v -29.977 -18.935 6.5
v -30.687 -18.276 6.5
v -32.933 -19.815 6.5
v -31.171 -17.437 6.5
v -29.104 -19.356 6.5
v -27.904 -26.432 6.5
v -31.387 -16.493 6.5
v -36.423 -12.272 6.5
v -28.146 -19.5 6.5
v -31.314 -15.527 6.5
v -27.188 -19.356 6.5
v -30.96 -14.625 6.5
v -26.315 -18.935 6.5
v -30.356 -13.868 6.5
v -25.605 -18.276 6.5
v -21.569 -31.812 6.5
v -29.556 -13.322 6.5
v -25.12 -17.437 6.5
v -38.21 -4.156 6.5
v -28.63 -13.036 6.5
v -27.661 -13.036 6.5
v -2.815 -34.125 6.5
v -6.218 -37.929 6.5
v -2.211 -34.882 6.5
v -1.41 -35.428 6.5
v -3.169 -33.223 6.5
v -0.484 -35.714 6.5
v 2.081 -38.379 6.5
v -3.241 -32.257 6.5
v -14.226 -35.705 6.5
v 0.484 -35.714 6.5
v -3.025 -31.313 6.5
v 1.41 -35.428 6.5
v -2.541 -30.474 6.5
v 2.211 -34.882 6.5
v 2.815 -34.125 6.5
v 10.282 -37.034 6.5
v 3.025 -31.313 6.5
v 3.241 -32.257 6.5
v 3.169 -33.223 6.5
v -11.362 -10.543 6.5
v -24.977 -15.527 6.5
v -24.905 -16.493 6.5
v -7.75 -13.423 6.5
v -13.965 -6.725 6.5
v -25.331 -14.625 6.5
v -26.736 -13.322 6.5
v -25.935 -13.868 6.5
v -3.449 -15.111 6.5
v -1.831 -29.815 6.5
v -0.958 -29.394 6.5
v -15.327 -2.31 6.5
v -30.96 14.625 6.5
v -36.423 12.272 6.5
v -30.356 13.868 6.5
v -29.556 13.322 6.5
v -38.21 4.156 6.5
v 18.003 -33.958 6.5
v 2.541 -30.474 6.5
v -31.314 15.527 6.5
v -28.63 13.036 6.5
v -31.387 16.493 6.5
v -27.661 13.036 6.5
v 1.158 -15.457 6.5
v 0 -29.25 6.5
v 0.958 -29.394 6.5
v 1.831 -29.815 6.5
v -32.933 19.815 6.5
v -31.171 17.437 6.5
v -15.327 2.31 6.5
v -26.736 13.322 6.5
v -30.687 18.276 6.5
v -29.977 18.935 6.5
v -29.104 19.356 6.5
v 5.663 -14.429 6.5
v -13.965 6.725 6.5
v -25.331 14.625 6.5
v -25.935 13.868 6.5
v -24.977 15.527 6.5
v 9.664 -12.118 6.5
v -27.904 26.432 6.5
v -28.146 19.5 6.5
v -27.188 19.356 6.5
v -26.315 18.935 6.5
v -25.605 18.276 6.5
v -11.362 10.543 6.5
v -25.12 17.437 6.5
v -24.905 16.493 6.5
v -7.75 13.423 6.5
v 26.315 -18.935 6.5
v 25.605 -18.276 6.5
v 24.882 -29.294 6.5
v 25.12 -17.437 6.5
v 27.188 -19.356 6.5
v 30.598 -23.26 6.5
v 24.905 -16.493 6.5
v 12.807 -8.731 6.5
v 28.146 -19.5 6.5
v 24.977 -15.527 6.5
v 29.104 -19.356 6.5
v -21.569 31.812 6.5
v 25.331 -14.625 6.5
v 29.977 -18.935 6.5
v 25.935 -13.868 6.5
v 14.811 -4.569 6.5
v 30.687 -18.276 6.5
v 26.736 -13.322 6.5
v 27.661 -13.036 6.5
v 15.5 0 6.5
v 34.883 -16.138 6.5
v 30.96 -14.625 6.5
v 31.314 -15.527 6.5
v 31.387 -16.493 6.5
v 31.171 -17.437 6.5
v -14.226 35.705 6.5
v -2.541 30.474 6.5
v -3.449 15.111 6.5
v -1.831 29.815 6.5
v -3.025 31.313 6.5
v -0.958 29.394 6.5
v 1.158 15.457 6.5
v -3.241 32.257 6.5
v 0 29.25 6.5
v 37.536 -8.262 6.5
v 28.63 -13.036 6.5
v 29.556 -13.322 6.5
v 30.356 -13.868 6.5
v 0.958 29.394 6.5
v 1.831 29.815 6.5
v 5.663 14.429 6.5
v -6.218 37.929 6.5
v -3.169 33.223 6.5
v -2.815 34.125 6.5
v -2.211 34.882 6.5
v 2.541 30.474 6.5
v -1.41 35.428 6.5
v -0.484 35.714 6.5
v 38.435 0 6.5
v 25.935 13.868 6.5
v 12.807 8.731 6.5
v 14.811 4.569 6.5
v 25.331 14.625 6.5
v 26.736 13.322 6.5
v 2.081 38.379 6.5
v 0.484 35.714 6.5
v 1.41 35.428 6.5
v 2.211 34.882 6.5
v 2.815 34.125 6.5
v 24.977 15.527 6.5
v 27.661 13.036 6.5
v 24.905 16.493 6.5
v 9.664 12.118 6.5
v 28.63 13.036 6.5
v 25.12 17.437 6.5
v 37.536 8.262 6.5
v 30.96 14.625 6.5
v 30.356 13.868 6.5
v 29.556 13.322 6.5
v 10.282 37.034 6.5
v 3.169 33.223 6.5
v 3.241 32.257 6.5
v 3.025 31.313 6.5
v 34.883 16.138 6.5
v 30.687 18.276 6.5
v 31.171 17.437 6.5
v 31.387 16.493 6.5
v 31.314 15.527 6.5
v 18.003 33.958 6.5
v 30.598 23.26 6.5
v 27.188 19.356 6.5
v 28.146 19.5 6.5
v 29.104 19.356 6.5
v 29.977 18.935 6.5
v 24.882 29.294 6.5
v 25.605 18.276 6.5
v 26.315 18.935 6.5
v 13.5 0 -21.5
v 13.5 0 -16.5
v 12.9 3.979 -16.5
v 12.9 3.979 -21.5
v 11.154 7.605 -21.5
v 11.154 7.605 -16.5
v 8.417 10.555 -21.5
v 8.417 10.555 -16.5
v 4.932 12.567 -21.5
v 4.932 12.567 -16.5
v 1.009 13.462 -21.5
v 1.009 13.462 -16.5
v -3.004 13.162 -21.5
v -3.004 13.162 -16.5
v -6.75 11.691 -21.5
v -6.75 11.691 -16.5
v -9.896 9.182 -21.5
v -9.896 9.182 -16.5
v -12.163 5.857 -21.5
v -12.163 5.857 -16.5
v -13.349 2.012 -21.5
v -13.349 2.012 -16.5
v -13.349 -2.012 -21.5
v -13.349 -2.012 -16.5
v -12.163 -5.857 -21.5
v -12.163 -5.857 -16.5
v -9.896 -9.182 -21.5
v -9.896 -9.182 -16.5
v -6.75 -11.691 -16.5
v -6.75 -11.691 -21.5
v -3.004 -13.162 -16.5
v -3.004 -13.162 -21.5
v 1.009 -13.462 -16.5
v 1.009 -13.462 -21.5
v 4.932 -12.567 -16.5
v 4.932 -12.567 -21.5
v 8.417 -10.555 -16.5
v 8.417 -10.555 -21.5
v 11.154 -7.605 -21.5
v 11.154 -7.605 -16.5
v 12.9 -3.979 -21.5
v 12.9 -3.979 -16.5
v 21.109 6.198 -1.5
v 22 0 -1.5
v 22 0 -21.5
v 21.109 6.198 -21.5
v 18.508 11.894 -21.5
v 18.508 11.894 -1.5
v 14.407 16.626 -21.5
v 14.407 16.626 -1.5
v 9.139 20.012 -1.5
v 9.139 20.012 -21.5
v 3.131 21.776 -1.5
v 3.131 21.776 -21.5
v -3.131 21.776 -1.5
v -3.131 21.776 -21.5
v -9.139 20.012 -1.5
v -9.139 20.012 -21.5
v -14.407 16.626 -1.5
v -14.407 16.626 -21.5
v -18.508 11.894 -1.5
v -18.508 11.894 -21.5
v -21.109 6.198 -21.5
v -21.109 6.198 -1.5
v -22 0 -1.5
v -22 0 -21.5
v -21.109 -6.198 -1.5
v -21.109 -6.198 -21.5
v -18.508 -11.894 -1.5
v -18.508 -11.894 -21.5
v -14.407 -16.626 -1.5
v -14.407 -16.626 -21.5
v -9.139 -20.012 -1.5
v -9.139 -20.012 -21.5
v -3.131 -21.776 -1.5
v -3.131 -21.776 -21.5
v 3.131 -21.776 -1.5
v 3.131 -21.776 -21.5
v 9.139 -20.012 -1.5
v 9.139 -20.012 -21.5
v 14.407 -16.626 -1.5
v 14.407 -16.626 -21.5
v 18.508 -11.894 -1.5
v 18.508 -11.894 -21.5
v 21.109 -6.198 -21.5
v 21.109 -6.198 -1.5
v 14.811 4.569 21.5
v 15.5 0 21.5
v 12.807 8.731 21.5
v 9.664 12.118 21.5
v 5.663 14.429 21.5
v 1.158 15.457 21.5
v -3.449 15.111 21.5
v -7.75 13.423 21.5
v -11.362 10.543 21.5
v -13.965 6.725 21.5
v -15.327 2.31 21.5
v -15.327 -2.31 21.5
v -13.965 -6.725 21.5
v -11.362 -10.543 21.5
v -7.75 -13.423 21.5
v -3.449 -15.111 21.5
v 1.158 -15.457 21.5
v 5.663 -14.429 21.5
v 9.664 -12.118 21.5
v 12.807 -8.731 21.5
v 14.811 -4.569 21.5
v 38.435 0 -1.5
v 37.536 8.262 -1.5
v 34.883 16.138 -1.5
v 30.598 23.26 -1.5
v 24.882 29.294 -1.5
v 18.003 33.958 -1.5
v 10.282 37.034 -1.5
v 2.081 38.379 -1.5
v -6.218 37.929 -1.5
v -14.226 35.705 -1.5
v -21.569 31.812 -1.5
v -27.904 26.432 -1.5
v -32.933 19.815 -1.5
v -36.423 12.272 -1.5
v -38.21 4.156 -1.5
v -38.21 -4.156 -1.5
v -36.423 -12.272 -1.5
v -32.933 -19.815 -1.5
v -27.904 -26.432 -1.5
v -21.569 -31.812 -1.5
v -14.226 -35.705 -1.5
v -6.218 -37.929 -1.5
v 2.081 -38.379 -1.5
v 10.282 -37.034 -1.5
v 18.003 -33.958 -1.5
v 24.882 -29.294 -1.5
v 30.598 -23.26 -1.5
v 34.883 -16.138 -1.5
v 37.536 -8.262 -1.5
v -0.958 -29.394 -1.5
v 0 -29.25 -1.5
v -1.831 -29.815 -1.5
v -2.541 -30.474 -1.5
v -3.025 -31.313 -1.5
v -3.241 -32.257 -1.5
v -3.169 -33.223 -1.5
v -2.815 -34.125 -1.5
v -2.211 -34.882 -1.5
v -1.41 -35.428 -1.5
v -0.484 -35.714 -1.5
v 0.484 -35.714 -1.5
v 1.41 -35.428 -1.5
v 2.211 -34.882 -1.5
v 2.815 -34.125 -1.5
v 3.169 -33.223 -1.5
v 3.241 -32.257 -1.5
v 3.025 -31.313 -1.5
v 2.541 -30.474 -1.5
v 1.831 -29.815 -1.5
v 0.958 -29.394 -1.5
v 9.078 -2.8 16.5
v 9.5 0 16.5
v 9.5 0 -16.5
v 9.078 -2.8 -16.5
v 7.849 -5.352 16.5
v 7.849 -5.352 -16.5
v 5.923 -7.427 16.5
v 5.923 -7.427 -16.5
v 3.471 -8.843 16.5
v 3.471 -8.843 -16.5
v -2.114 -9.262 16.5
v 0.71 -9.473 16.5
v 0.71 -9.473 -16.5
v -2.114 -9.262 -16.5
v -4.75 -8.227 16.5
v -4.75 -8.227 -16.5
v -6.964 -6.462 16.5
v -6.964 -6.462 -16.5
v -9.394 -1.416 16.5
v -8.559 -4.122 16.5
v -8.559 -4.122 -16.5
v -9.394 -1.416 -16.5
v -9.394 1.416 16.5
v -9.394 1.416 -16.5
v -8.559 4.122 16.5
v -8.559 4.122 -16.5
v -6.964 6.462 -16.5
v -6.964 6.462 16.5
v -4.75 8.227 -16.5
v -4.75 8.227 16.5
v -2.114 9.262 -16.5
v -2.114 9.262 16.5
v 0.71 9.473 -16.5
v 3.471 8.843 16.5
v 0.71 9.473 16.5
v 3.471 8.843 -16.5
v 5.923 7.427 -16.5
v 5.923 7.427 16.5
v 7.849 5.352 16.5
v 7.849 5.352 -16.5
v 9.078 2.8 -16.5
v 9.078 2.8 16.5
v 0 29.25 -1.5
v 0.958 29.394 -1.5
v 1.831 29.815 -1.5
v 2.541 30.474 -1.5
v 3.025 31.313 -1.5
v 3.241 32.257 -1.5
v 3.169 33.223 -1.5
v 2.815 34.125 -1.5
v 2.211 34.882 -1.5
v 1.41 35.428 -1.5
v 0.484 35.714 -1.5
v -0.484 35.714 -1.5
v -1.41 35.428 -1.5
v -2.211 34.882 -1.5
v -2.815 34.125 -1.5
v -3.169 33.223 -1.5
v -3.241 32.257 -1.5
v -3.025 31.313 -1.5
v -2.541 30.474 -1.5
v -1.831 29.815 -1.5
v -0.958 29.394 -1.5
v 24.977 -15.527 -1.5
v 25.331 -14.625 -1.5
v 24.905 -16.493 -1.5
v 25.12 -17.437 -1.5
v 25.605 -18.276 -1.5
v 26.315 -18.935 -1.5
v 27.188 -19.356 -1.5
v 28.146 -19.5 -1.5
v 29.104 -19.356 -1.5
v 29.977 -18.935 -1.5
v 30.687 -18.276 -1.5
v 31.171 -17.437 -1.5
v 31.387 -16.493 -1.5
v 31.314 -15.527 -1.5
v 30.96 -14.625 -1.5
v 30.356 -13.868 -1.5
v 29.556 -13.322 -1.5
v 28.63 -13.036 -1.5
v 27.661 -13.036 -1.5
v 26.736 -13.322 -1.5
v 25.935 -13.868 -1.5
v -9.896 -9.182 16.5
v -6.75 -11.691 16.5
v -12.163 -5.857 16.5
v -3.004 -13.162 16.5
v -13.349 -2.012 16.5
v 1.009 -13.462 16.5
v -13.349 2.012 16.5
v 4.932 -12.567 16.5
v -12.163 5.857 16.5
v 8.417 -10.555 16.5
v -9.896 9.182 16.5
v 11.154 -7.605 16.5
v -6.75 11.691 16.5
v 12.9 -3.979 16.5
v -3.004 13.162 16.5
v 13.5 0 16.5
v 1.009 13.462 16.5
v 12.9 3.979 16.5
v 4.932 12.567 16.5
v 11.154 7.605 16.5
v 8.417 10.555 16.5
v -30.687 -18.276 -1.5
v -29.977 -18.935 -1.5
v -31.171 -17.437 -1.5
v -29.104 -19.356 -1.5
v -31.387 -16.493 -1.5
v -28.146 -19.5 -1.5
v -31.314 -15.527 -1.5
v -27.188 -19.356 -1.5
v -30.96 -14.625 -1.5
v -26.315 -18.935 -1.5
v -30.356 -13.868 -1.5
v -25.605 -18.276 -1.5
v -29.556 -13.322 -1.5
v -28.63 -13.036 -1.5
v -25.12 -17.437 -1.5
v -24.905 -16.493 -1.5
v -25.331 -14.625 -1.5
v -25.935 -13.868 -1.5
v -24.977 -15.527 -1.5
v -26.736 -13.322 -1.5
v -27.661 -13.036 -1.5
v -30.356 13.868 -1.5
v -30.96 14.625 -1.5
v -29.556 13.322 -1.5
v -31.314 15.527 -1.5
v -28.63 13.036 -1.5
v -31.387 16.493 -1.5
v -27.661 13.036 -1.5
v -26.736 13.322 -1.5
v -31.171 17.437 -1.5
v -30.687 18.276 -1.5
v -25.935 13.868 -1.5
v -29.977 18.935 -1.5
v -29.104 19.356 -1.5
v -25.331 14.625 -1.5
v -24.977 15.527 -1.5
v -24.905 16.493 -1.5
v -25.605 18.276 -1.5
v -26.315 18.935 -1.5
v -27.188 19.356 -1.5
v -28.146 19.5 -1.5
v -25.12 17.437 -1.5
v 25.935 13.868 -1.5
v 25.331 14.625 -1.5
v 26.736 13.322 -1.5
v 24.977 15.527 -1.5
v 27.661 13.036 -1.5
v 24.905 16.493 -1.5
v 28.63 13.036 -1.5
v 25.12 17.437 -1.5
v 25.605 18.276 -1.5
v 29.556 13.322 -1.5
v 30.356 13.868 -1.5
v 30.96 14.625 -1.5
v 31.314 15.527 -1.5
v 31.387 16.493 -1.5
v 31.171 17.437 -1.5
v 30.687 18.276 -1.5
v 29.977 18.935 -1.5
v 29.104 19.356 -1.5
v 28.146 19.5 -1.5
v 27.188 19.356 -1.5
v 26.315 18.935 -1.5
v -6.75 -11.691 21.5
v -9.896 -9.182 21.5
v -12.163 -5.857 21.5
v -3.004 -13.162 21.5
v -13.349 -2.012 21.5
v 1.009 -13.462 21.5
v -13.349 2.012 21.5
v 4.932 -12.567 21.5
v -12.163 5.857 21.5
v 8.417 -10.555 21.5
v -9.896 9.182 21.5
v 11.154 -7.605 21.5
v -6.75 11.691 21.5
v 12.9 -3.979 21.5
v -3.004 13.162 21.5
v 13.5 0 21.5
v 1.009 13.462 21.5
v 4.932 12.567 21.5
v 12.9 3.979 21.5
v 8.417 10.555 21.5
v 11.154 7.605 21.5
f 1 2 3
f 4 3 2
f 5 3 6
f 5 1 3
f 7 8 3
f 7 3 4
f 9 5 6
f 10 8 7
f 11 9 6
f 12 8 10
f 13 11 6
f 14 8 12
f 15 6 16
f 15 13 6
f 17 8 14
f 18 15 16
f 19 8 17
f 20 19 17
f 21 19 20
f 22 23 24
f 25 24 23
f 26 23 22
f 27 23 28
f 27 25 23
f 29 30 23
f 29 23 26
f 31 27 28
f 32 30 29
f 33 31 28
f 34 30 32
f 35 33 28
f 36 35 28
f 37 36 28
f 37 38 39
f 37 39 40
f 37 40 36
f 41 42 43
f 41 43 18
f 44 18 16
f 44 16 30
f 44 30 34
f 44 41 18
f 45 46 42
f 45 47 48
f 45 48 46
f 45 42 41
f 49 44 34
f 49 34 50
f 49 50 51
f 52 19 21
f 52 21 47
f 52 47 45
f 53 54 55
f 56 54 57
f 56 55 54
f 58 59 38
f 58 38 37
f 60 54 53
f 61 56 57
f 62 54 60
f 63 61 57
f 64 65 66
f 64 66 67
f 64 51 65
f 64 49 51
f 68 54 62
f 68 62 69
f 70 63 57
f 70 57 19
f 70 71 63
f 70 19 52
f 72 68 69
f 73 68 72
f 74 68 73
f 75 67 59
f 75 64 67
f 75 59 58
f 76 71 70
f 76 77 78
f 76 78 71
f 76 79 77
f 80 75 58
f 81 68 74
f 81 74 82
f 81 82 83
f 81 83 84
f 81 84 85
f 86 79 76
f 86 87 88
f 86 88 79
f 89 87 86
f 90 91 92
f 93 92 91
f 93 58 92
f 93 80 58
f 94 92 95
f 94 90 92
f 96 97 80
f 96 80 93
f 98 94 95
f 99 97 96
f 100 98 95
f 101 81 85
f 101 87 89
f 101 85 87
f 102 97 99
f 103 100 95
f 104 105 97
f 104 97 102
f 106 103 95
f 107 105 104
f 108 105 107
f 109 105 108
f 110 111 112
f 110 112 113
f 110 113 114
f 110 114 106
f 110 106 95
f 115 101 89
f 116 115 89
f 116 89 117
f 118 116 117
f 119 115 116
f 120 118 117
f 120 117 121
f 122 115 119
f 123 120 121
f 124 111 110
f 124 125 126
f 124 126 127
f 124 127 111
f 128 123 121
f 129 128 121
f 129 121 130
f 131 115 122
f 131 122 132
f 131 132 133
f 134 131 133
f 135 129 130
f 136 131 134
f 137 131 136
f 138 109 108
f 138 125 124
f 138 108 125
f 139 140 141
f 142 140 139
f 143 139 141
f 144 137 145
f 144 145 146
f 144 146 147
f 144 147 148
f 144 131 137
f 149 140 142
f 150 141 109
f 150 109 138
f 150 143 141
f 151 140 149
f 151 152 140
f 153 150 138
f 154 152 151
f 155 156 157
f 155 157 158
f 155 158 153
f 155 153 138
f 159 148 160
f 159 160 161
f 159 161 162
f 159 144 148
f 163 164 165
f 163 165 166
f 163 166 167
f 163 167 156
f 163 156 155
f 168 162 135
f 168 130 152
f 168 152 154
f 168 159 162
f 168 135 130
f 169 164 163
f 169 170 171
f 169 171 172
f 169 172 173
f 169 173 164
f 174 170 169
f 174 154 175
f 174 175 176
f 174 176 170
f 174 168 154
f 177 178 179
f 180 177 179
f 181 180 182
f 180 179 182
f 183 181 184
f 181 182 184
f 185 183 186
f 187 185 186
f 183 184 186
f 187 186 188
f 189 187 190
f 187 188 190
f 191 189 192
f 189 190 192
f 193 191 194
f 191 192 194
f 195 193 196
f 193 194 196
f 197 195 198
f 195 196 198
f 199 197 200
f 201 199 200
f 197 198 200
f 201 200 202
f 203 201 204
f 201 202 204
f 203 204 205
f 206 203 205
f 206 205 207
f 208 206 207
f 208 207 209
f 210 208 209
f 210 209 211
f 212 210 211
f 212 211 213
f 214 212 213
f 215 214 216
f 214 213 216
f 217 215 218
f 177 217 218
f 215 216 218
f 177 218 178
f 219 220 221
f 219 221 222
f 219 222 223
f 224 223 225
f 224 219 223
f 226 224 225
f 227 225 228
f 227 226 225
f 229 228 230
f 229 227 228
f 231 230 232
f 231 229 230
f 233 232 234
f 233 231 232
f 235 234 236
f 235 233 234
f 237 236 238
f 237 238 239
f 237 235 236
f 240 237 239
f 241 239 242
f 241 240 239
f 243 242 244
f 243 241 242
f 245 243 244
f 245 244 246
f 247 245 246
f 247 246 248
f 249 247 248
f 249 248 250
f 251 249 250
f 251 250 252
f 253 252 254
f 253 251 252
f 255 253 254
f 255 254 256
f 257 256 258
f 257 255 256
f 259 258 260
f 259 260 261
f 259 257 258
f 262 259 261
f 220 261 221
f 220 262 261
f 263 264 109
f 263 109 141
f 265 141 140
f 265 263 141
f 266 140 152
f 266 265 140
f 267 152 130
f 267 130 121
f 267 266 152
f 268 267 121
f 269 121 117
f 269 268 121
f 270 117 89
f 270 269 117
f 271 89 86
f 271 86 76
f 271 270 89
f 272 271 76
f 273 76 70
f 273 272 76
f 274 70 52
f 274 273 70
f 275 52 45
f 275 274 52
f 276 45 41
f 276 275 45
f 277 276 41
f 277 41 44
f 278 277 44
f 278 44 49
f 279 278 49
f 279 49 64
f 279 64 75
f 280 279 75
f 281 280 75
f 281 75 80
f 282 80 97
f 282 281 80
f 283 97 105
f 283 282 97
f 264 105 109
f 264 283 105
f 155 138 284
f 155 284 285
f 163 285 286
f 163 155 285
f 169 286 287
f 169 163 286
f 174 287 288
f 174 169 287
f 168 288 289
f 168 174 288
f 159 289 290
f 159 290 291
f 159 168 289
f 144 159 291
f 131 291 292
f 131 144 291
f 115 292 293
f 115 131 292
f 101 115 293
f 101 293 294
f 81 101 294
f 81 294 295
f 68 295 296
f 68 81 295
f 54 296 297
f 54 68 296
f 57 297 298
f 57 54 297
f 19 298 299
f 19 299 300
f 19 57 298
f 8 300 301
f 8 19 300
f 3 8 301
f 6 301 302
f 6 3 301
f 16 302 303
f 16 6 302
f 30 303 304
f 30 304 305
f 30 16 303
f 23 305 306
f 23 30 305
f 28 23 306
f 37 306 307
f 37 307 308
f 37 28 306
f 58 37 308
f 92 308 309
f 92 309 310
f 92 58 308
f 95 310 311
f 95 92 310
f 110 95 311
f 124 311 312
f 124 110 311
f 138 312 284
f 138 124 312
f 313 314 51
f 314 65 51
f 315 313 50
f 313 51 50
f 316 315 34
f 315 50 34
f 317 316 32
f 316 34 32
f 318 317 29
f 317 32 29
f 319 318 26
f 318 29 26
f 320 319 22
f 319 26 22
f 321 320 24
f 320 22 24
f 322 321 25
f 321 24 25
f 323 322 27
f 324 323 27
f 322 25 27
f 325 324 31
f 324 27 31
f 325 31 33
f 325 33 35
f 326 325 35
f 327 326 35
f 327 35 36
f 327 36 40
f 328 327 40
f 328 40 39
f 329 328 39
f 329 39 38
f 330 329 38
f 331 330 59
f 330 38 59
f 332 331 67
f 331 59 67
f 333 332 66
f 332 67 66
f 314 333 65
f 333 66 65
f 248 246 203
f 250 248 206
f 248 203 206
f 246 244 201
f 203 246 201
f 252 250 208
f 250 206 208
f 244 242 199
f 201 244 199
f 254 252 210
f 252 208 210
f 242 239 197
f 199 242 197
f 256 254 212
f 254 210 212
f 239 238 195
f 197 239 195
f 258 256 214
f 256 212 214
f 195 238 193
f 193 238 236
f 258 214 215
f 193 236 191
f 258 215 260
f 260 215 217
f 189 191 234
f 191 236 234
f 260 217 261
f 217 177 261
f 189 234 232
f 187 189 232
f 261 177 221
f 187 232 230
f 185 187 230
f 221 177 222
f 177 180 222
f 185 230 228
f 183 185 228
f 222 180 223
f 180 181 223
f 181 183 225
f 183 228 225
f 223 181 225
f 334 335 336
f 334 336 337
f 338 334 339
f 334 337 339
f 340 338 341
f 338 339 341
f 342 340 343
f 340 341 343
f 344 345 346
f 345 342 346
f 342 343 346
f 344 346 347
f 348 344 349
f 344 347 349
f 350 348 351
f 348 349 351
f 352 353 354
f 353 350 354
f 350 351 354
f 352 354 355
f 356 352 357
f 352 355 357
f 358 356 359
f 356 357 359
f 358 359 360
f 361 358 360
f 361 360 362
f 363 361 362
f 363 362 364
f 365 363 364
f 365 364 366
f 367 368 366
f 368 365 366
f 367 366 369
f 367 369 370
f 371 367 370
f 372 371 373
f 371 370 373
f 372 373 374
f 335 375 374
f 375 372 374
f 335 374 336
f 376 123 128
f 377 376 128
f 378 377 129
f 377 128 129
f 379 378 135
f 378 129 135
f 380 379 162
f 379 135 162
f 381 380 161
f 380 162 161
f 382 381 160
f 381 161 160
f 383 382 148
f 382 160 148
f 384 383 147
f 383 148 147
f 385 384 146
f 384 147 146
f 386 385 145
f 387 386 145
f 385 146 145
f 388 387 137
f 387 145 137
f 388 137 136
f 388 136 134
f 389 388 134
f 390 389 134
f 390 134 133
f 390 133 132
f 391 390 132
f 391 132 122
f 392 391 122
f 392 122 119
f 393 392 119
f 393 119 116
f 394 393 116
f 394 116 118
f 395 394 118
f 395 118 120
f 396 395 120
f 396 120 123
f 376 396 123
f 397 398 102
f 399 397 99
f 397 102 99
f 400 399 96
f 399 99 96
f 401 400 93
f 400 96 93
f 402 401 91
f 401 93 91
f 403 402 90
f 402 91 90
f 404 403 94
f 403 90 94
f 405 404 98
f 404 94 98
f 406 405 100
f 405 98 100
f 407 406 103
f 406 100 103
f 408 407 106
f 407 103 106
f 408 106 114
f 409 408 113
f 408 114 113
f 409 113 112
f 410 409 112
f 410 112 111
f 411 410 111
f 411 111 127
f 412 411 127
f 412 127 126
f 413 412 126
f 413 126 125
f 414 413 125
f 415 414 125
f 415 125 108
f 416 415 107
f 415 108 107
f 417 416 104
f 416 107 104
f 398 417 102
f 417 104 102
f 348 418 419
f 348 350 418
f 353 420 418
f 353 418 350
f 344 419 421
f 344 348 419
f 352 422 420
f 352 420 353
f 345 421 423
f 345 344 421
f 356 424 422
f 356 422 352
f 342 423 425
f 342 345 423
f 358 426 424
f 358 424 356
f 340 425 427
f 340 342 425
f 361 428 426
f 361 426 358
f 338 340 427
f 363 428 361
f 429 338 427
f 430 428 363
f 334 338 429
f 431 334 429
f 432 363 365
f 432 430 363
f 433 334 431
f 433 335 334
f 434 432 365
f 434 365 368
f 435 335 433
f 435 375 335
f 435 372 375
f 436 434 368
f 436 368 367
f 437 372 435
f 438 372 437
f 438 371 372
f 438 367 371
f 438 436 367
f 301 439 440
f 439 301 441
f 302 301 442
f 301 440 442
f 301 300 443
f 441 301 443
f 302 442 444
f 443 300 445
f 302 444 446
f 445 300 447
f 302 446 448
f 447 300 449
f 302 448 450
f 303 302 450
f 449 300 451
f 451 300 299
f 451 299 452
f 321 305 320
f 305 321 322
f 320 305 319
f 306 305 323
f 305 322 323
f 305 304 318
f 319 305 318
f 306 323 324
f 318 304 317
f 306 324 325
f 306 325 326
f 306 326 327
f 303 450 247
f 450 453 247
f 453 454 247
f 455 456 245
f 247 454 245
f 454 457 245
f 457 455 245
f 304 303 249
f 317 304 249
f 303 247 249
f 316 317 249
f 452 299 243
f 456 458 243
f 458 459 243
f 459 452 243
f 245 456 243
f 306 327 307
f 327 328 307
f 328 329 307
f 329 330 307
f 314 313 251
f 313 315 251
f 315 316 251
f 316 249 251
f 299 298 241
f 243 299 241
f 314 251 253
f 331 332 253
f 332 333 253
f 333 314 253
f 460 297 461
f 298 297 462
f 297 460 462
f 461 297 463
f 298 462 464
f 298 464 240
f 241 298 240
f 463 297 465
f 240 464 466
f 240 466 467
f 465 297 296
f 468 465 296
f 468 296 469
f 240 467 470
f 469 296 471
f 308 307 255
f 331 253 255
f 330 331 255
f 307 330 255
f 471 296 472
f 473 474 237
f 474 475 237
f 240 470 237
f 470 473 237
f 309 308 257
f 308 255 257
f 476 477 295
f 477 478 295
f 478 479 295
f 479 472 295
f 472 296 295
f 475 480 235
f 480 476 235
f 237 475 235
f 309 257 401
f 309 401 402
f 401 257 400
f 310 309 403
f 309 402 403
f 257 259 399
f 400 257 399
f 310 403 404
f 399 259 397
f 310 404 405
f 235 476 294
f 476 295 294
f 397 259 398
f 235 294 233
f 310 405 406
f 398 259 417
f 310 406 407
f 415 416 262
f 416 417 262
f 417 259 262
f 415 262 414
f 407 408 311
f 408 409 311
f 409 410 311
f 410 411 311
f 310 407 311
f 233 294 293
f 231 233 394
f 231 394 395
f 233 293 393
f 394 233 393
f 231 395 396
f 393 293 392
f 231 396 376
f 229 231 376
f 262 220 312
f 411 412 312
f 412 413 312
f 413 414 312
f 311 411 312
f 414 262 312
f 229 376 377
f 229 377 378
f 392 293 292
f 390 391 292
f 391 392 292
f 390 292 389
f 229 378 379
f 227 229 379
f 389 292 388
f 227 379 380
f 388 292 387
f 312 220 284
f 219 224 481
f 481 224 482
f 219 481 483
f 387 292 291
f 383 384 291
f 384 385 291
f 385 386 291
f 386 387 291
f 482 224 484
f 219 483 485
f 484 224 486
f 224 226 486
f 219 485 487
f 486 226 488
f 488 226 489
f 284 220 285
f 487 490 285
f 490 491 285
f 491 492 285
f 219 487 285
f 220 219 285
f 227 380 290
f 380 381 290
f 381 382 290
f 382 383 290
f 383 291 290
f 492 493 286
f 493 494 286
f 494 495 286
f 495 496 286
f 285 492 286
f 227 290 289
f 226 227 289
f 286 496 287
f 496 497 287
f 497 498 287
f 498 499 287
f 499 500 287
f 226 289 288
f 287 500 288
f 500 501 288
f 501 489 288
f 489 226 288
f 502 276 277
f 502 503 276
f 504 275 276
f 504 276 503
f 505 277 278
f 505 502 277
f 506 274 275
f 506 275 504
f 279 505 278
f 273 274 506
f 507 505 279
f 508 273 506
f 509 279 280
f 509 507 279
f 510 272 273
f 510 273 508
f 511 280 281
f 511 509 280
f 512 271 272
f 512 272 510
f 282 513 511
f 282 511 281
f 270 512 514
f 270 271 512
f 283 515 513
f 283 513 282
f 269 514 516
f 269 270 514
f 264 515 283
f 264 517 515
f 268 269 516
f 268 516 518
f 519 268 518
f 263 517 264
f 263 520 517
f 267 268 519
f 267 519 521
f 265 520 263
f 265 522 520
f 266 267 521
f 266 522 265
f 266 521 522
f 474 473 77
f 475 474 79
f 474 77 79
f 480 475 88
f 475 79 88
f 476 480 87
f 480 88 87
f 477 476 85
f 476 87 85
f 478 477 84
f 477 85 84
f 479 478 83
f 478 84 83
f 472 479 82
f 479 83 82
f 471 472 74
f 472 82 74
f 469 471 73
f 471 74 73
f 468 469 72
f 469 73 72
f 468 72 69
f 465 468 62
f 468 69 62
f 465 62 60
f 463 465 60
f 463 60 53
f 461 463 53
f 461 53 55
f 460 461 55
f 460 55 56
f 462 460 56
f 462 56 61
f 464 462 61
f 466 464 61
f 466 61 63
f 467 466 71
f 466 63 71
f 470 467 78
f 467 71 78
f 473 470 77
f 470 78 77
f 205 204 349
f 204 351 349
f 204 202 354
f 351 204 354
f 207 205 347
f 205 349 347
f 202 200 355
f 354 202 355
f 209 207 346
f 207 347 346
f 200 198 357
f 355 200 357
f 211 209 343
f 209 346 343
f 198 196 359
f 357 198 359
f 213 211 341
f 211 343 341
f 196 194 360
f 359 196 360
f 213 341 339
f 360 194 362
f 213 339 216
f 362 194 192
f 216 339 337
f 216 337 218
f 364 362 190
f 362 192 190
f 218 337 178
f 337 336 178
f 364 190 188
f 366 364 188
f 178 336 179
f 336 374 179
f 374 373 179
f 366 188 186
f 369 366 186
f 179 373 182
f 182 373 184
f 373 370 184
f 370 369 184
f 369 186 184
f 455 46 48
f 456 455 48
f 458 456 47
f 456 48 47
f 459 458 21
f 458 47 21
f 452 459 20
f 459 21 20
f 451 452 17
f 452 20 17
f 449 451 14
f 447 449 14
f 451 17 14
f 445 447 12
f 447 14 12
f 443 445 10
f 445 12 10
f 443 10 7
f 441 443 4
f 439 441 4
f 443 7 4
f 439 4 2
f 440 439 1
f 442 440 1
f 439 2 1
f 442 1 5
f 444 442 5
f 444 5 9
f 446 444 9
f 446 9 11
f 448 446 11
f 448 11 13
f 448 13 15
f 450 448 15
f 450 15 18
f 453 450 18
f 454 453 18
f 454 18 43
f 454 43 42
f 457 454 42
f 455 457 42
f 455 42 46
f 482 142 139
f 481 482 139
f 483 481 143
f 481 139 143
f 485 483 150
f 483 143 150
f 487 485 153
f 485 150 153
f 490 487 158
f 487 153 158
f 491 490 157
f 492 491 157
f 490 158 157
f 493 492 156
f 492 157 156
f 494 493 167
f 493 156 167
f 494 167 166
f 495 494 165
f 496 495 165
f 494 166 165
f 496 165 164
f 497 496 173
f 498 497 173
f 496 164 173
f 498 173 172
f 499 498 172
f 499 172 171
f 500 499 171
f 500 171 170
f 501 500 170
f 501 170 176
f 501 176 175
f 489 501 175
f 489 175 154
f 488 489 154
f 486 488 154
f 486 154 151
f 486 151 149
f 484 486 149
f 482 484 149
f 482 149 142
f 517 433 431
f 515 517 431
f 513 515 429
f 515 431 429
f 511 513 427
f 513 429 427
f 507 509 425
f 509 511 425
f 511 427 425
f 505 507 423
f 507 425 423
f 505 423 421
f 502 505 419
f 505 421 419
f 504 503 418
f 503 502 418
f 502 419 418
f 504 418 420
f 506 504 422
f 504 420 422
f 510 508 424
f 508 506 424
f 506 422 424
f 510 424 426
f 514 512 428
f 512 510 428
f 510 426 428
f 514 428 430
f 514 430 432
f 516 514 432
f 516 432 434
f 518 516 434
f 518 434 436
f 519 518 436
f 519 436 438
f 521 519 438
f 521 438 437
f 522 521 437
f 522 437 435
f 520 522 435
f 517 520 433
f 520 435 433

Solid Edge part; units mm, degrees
sketch "Sketch1" plane through (0, 0, 0) normal (0, -1, 0) x (1, 0, 0)
  line L0 (9.5, 16.5) -> (9.5, -16.5)
  line L1 (13.5, -16.5) -> (9.5, -16.5)
  line L2 (13.5, -21.5) -> (13.5, -16.5)
  line L3 (22, -21.5) -> (13.5, -21.5)
  line L4 (22, -21.5) -> (22, -1.5)
  line L5 (22, -1.5) -> (38.435, -1.5)
  line L6 (38.435, -1.5) -> (38.435, 6.5)
  line L7 (38.435, 6.5) -> (15.5, 6.5)
  line L8 (15.5, 6.5) -> (15.5, 21.5)
  line L9 (15.5, 21.5) -> (13.5, 21.5)
  line L10 (13.5, 21.5) -> (13.5, 16.5)
  line L11 (13.5, 16.5) -> (9.5, 16.5)
  dimension "D1" = 8
  dimension "D2" = 15
  dimension "D3" = 9.5
  dimension "D4" = 13.5
  dimension "D5" = 15.5
  dimension "D6" = 38.435
  dimension "D7" = 22
  dimension "D8" = 43
  dimension "D9" = 5
  dimension "D10" = 13.5
  dimension "D11" = 5
revolve "RevolvedProtrusion1" add sketch "Sketch1" angle 360 about axis through (0, 0, 0) along (0, 0, 1)
hole "Hole1" at (0, 32.5, 6.5) direction (0, 0, -1) diameter 6.5 end up to next
pattern_circular "Pattern1" count 6 over 360 about axis through (0, 0, 6.5) along (0, 0, -1) of "Hole1"
